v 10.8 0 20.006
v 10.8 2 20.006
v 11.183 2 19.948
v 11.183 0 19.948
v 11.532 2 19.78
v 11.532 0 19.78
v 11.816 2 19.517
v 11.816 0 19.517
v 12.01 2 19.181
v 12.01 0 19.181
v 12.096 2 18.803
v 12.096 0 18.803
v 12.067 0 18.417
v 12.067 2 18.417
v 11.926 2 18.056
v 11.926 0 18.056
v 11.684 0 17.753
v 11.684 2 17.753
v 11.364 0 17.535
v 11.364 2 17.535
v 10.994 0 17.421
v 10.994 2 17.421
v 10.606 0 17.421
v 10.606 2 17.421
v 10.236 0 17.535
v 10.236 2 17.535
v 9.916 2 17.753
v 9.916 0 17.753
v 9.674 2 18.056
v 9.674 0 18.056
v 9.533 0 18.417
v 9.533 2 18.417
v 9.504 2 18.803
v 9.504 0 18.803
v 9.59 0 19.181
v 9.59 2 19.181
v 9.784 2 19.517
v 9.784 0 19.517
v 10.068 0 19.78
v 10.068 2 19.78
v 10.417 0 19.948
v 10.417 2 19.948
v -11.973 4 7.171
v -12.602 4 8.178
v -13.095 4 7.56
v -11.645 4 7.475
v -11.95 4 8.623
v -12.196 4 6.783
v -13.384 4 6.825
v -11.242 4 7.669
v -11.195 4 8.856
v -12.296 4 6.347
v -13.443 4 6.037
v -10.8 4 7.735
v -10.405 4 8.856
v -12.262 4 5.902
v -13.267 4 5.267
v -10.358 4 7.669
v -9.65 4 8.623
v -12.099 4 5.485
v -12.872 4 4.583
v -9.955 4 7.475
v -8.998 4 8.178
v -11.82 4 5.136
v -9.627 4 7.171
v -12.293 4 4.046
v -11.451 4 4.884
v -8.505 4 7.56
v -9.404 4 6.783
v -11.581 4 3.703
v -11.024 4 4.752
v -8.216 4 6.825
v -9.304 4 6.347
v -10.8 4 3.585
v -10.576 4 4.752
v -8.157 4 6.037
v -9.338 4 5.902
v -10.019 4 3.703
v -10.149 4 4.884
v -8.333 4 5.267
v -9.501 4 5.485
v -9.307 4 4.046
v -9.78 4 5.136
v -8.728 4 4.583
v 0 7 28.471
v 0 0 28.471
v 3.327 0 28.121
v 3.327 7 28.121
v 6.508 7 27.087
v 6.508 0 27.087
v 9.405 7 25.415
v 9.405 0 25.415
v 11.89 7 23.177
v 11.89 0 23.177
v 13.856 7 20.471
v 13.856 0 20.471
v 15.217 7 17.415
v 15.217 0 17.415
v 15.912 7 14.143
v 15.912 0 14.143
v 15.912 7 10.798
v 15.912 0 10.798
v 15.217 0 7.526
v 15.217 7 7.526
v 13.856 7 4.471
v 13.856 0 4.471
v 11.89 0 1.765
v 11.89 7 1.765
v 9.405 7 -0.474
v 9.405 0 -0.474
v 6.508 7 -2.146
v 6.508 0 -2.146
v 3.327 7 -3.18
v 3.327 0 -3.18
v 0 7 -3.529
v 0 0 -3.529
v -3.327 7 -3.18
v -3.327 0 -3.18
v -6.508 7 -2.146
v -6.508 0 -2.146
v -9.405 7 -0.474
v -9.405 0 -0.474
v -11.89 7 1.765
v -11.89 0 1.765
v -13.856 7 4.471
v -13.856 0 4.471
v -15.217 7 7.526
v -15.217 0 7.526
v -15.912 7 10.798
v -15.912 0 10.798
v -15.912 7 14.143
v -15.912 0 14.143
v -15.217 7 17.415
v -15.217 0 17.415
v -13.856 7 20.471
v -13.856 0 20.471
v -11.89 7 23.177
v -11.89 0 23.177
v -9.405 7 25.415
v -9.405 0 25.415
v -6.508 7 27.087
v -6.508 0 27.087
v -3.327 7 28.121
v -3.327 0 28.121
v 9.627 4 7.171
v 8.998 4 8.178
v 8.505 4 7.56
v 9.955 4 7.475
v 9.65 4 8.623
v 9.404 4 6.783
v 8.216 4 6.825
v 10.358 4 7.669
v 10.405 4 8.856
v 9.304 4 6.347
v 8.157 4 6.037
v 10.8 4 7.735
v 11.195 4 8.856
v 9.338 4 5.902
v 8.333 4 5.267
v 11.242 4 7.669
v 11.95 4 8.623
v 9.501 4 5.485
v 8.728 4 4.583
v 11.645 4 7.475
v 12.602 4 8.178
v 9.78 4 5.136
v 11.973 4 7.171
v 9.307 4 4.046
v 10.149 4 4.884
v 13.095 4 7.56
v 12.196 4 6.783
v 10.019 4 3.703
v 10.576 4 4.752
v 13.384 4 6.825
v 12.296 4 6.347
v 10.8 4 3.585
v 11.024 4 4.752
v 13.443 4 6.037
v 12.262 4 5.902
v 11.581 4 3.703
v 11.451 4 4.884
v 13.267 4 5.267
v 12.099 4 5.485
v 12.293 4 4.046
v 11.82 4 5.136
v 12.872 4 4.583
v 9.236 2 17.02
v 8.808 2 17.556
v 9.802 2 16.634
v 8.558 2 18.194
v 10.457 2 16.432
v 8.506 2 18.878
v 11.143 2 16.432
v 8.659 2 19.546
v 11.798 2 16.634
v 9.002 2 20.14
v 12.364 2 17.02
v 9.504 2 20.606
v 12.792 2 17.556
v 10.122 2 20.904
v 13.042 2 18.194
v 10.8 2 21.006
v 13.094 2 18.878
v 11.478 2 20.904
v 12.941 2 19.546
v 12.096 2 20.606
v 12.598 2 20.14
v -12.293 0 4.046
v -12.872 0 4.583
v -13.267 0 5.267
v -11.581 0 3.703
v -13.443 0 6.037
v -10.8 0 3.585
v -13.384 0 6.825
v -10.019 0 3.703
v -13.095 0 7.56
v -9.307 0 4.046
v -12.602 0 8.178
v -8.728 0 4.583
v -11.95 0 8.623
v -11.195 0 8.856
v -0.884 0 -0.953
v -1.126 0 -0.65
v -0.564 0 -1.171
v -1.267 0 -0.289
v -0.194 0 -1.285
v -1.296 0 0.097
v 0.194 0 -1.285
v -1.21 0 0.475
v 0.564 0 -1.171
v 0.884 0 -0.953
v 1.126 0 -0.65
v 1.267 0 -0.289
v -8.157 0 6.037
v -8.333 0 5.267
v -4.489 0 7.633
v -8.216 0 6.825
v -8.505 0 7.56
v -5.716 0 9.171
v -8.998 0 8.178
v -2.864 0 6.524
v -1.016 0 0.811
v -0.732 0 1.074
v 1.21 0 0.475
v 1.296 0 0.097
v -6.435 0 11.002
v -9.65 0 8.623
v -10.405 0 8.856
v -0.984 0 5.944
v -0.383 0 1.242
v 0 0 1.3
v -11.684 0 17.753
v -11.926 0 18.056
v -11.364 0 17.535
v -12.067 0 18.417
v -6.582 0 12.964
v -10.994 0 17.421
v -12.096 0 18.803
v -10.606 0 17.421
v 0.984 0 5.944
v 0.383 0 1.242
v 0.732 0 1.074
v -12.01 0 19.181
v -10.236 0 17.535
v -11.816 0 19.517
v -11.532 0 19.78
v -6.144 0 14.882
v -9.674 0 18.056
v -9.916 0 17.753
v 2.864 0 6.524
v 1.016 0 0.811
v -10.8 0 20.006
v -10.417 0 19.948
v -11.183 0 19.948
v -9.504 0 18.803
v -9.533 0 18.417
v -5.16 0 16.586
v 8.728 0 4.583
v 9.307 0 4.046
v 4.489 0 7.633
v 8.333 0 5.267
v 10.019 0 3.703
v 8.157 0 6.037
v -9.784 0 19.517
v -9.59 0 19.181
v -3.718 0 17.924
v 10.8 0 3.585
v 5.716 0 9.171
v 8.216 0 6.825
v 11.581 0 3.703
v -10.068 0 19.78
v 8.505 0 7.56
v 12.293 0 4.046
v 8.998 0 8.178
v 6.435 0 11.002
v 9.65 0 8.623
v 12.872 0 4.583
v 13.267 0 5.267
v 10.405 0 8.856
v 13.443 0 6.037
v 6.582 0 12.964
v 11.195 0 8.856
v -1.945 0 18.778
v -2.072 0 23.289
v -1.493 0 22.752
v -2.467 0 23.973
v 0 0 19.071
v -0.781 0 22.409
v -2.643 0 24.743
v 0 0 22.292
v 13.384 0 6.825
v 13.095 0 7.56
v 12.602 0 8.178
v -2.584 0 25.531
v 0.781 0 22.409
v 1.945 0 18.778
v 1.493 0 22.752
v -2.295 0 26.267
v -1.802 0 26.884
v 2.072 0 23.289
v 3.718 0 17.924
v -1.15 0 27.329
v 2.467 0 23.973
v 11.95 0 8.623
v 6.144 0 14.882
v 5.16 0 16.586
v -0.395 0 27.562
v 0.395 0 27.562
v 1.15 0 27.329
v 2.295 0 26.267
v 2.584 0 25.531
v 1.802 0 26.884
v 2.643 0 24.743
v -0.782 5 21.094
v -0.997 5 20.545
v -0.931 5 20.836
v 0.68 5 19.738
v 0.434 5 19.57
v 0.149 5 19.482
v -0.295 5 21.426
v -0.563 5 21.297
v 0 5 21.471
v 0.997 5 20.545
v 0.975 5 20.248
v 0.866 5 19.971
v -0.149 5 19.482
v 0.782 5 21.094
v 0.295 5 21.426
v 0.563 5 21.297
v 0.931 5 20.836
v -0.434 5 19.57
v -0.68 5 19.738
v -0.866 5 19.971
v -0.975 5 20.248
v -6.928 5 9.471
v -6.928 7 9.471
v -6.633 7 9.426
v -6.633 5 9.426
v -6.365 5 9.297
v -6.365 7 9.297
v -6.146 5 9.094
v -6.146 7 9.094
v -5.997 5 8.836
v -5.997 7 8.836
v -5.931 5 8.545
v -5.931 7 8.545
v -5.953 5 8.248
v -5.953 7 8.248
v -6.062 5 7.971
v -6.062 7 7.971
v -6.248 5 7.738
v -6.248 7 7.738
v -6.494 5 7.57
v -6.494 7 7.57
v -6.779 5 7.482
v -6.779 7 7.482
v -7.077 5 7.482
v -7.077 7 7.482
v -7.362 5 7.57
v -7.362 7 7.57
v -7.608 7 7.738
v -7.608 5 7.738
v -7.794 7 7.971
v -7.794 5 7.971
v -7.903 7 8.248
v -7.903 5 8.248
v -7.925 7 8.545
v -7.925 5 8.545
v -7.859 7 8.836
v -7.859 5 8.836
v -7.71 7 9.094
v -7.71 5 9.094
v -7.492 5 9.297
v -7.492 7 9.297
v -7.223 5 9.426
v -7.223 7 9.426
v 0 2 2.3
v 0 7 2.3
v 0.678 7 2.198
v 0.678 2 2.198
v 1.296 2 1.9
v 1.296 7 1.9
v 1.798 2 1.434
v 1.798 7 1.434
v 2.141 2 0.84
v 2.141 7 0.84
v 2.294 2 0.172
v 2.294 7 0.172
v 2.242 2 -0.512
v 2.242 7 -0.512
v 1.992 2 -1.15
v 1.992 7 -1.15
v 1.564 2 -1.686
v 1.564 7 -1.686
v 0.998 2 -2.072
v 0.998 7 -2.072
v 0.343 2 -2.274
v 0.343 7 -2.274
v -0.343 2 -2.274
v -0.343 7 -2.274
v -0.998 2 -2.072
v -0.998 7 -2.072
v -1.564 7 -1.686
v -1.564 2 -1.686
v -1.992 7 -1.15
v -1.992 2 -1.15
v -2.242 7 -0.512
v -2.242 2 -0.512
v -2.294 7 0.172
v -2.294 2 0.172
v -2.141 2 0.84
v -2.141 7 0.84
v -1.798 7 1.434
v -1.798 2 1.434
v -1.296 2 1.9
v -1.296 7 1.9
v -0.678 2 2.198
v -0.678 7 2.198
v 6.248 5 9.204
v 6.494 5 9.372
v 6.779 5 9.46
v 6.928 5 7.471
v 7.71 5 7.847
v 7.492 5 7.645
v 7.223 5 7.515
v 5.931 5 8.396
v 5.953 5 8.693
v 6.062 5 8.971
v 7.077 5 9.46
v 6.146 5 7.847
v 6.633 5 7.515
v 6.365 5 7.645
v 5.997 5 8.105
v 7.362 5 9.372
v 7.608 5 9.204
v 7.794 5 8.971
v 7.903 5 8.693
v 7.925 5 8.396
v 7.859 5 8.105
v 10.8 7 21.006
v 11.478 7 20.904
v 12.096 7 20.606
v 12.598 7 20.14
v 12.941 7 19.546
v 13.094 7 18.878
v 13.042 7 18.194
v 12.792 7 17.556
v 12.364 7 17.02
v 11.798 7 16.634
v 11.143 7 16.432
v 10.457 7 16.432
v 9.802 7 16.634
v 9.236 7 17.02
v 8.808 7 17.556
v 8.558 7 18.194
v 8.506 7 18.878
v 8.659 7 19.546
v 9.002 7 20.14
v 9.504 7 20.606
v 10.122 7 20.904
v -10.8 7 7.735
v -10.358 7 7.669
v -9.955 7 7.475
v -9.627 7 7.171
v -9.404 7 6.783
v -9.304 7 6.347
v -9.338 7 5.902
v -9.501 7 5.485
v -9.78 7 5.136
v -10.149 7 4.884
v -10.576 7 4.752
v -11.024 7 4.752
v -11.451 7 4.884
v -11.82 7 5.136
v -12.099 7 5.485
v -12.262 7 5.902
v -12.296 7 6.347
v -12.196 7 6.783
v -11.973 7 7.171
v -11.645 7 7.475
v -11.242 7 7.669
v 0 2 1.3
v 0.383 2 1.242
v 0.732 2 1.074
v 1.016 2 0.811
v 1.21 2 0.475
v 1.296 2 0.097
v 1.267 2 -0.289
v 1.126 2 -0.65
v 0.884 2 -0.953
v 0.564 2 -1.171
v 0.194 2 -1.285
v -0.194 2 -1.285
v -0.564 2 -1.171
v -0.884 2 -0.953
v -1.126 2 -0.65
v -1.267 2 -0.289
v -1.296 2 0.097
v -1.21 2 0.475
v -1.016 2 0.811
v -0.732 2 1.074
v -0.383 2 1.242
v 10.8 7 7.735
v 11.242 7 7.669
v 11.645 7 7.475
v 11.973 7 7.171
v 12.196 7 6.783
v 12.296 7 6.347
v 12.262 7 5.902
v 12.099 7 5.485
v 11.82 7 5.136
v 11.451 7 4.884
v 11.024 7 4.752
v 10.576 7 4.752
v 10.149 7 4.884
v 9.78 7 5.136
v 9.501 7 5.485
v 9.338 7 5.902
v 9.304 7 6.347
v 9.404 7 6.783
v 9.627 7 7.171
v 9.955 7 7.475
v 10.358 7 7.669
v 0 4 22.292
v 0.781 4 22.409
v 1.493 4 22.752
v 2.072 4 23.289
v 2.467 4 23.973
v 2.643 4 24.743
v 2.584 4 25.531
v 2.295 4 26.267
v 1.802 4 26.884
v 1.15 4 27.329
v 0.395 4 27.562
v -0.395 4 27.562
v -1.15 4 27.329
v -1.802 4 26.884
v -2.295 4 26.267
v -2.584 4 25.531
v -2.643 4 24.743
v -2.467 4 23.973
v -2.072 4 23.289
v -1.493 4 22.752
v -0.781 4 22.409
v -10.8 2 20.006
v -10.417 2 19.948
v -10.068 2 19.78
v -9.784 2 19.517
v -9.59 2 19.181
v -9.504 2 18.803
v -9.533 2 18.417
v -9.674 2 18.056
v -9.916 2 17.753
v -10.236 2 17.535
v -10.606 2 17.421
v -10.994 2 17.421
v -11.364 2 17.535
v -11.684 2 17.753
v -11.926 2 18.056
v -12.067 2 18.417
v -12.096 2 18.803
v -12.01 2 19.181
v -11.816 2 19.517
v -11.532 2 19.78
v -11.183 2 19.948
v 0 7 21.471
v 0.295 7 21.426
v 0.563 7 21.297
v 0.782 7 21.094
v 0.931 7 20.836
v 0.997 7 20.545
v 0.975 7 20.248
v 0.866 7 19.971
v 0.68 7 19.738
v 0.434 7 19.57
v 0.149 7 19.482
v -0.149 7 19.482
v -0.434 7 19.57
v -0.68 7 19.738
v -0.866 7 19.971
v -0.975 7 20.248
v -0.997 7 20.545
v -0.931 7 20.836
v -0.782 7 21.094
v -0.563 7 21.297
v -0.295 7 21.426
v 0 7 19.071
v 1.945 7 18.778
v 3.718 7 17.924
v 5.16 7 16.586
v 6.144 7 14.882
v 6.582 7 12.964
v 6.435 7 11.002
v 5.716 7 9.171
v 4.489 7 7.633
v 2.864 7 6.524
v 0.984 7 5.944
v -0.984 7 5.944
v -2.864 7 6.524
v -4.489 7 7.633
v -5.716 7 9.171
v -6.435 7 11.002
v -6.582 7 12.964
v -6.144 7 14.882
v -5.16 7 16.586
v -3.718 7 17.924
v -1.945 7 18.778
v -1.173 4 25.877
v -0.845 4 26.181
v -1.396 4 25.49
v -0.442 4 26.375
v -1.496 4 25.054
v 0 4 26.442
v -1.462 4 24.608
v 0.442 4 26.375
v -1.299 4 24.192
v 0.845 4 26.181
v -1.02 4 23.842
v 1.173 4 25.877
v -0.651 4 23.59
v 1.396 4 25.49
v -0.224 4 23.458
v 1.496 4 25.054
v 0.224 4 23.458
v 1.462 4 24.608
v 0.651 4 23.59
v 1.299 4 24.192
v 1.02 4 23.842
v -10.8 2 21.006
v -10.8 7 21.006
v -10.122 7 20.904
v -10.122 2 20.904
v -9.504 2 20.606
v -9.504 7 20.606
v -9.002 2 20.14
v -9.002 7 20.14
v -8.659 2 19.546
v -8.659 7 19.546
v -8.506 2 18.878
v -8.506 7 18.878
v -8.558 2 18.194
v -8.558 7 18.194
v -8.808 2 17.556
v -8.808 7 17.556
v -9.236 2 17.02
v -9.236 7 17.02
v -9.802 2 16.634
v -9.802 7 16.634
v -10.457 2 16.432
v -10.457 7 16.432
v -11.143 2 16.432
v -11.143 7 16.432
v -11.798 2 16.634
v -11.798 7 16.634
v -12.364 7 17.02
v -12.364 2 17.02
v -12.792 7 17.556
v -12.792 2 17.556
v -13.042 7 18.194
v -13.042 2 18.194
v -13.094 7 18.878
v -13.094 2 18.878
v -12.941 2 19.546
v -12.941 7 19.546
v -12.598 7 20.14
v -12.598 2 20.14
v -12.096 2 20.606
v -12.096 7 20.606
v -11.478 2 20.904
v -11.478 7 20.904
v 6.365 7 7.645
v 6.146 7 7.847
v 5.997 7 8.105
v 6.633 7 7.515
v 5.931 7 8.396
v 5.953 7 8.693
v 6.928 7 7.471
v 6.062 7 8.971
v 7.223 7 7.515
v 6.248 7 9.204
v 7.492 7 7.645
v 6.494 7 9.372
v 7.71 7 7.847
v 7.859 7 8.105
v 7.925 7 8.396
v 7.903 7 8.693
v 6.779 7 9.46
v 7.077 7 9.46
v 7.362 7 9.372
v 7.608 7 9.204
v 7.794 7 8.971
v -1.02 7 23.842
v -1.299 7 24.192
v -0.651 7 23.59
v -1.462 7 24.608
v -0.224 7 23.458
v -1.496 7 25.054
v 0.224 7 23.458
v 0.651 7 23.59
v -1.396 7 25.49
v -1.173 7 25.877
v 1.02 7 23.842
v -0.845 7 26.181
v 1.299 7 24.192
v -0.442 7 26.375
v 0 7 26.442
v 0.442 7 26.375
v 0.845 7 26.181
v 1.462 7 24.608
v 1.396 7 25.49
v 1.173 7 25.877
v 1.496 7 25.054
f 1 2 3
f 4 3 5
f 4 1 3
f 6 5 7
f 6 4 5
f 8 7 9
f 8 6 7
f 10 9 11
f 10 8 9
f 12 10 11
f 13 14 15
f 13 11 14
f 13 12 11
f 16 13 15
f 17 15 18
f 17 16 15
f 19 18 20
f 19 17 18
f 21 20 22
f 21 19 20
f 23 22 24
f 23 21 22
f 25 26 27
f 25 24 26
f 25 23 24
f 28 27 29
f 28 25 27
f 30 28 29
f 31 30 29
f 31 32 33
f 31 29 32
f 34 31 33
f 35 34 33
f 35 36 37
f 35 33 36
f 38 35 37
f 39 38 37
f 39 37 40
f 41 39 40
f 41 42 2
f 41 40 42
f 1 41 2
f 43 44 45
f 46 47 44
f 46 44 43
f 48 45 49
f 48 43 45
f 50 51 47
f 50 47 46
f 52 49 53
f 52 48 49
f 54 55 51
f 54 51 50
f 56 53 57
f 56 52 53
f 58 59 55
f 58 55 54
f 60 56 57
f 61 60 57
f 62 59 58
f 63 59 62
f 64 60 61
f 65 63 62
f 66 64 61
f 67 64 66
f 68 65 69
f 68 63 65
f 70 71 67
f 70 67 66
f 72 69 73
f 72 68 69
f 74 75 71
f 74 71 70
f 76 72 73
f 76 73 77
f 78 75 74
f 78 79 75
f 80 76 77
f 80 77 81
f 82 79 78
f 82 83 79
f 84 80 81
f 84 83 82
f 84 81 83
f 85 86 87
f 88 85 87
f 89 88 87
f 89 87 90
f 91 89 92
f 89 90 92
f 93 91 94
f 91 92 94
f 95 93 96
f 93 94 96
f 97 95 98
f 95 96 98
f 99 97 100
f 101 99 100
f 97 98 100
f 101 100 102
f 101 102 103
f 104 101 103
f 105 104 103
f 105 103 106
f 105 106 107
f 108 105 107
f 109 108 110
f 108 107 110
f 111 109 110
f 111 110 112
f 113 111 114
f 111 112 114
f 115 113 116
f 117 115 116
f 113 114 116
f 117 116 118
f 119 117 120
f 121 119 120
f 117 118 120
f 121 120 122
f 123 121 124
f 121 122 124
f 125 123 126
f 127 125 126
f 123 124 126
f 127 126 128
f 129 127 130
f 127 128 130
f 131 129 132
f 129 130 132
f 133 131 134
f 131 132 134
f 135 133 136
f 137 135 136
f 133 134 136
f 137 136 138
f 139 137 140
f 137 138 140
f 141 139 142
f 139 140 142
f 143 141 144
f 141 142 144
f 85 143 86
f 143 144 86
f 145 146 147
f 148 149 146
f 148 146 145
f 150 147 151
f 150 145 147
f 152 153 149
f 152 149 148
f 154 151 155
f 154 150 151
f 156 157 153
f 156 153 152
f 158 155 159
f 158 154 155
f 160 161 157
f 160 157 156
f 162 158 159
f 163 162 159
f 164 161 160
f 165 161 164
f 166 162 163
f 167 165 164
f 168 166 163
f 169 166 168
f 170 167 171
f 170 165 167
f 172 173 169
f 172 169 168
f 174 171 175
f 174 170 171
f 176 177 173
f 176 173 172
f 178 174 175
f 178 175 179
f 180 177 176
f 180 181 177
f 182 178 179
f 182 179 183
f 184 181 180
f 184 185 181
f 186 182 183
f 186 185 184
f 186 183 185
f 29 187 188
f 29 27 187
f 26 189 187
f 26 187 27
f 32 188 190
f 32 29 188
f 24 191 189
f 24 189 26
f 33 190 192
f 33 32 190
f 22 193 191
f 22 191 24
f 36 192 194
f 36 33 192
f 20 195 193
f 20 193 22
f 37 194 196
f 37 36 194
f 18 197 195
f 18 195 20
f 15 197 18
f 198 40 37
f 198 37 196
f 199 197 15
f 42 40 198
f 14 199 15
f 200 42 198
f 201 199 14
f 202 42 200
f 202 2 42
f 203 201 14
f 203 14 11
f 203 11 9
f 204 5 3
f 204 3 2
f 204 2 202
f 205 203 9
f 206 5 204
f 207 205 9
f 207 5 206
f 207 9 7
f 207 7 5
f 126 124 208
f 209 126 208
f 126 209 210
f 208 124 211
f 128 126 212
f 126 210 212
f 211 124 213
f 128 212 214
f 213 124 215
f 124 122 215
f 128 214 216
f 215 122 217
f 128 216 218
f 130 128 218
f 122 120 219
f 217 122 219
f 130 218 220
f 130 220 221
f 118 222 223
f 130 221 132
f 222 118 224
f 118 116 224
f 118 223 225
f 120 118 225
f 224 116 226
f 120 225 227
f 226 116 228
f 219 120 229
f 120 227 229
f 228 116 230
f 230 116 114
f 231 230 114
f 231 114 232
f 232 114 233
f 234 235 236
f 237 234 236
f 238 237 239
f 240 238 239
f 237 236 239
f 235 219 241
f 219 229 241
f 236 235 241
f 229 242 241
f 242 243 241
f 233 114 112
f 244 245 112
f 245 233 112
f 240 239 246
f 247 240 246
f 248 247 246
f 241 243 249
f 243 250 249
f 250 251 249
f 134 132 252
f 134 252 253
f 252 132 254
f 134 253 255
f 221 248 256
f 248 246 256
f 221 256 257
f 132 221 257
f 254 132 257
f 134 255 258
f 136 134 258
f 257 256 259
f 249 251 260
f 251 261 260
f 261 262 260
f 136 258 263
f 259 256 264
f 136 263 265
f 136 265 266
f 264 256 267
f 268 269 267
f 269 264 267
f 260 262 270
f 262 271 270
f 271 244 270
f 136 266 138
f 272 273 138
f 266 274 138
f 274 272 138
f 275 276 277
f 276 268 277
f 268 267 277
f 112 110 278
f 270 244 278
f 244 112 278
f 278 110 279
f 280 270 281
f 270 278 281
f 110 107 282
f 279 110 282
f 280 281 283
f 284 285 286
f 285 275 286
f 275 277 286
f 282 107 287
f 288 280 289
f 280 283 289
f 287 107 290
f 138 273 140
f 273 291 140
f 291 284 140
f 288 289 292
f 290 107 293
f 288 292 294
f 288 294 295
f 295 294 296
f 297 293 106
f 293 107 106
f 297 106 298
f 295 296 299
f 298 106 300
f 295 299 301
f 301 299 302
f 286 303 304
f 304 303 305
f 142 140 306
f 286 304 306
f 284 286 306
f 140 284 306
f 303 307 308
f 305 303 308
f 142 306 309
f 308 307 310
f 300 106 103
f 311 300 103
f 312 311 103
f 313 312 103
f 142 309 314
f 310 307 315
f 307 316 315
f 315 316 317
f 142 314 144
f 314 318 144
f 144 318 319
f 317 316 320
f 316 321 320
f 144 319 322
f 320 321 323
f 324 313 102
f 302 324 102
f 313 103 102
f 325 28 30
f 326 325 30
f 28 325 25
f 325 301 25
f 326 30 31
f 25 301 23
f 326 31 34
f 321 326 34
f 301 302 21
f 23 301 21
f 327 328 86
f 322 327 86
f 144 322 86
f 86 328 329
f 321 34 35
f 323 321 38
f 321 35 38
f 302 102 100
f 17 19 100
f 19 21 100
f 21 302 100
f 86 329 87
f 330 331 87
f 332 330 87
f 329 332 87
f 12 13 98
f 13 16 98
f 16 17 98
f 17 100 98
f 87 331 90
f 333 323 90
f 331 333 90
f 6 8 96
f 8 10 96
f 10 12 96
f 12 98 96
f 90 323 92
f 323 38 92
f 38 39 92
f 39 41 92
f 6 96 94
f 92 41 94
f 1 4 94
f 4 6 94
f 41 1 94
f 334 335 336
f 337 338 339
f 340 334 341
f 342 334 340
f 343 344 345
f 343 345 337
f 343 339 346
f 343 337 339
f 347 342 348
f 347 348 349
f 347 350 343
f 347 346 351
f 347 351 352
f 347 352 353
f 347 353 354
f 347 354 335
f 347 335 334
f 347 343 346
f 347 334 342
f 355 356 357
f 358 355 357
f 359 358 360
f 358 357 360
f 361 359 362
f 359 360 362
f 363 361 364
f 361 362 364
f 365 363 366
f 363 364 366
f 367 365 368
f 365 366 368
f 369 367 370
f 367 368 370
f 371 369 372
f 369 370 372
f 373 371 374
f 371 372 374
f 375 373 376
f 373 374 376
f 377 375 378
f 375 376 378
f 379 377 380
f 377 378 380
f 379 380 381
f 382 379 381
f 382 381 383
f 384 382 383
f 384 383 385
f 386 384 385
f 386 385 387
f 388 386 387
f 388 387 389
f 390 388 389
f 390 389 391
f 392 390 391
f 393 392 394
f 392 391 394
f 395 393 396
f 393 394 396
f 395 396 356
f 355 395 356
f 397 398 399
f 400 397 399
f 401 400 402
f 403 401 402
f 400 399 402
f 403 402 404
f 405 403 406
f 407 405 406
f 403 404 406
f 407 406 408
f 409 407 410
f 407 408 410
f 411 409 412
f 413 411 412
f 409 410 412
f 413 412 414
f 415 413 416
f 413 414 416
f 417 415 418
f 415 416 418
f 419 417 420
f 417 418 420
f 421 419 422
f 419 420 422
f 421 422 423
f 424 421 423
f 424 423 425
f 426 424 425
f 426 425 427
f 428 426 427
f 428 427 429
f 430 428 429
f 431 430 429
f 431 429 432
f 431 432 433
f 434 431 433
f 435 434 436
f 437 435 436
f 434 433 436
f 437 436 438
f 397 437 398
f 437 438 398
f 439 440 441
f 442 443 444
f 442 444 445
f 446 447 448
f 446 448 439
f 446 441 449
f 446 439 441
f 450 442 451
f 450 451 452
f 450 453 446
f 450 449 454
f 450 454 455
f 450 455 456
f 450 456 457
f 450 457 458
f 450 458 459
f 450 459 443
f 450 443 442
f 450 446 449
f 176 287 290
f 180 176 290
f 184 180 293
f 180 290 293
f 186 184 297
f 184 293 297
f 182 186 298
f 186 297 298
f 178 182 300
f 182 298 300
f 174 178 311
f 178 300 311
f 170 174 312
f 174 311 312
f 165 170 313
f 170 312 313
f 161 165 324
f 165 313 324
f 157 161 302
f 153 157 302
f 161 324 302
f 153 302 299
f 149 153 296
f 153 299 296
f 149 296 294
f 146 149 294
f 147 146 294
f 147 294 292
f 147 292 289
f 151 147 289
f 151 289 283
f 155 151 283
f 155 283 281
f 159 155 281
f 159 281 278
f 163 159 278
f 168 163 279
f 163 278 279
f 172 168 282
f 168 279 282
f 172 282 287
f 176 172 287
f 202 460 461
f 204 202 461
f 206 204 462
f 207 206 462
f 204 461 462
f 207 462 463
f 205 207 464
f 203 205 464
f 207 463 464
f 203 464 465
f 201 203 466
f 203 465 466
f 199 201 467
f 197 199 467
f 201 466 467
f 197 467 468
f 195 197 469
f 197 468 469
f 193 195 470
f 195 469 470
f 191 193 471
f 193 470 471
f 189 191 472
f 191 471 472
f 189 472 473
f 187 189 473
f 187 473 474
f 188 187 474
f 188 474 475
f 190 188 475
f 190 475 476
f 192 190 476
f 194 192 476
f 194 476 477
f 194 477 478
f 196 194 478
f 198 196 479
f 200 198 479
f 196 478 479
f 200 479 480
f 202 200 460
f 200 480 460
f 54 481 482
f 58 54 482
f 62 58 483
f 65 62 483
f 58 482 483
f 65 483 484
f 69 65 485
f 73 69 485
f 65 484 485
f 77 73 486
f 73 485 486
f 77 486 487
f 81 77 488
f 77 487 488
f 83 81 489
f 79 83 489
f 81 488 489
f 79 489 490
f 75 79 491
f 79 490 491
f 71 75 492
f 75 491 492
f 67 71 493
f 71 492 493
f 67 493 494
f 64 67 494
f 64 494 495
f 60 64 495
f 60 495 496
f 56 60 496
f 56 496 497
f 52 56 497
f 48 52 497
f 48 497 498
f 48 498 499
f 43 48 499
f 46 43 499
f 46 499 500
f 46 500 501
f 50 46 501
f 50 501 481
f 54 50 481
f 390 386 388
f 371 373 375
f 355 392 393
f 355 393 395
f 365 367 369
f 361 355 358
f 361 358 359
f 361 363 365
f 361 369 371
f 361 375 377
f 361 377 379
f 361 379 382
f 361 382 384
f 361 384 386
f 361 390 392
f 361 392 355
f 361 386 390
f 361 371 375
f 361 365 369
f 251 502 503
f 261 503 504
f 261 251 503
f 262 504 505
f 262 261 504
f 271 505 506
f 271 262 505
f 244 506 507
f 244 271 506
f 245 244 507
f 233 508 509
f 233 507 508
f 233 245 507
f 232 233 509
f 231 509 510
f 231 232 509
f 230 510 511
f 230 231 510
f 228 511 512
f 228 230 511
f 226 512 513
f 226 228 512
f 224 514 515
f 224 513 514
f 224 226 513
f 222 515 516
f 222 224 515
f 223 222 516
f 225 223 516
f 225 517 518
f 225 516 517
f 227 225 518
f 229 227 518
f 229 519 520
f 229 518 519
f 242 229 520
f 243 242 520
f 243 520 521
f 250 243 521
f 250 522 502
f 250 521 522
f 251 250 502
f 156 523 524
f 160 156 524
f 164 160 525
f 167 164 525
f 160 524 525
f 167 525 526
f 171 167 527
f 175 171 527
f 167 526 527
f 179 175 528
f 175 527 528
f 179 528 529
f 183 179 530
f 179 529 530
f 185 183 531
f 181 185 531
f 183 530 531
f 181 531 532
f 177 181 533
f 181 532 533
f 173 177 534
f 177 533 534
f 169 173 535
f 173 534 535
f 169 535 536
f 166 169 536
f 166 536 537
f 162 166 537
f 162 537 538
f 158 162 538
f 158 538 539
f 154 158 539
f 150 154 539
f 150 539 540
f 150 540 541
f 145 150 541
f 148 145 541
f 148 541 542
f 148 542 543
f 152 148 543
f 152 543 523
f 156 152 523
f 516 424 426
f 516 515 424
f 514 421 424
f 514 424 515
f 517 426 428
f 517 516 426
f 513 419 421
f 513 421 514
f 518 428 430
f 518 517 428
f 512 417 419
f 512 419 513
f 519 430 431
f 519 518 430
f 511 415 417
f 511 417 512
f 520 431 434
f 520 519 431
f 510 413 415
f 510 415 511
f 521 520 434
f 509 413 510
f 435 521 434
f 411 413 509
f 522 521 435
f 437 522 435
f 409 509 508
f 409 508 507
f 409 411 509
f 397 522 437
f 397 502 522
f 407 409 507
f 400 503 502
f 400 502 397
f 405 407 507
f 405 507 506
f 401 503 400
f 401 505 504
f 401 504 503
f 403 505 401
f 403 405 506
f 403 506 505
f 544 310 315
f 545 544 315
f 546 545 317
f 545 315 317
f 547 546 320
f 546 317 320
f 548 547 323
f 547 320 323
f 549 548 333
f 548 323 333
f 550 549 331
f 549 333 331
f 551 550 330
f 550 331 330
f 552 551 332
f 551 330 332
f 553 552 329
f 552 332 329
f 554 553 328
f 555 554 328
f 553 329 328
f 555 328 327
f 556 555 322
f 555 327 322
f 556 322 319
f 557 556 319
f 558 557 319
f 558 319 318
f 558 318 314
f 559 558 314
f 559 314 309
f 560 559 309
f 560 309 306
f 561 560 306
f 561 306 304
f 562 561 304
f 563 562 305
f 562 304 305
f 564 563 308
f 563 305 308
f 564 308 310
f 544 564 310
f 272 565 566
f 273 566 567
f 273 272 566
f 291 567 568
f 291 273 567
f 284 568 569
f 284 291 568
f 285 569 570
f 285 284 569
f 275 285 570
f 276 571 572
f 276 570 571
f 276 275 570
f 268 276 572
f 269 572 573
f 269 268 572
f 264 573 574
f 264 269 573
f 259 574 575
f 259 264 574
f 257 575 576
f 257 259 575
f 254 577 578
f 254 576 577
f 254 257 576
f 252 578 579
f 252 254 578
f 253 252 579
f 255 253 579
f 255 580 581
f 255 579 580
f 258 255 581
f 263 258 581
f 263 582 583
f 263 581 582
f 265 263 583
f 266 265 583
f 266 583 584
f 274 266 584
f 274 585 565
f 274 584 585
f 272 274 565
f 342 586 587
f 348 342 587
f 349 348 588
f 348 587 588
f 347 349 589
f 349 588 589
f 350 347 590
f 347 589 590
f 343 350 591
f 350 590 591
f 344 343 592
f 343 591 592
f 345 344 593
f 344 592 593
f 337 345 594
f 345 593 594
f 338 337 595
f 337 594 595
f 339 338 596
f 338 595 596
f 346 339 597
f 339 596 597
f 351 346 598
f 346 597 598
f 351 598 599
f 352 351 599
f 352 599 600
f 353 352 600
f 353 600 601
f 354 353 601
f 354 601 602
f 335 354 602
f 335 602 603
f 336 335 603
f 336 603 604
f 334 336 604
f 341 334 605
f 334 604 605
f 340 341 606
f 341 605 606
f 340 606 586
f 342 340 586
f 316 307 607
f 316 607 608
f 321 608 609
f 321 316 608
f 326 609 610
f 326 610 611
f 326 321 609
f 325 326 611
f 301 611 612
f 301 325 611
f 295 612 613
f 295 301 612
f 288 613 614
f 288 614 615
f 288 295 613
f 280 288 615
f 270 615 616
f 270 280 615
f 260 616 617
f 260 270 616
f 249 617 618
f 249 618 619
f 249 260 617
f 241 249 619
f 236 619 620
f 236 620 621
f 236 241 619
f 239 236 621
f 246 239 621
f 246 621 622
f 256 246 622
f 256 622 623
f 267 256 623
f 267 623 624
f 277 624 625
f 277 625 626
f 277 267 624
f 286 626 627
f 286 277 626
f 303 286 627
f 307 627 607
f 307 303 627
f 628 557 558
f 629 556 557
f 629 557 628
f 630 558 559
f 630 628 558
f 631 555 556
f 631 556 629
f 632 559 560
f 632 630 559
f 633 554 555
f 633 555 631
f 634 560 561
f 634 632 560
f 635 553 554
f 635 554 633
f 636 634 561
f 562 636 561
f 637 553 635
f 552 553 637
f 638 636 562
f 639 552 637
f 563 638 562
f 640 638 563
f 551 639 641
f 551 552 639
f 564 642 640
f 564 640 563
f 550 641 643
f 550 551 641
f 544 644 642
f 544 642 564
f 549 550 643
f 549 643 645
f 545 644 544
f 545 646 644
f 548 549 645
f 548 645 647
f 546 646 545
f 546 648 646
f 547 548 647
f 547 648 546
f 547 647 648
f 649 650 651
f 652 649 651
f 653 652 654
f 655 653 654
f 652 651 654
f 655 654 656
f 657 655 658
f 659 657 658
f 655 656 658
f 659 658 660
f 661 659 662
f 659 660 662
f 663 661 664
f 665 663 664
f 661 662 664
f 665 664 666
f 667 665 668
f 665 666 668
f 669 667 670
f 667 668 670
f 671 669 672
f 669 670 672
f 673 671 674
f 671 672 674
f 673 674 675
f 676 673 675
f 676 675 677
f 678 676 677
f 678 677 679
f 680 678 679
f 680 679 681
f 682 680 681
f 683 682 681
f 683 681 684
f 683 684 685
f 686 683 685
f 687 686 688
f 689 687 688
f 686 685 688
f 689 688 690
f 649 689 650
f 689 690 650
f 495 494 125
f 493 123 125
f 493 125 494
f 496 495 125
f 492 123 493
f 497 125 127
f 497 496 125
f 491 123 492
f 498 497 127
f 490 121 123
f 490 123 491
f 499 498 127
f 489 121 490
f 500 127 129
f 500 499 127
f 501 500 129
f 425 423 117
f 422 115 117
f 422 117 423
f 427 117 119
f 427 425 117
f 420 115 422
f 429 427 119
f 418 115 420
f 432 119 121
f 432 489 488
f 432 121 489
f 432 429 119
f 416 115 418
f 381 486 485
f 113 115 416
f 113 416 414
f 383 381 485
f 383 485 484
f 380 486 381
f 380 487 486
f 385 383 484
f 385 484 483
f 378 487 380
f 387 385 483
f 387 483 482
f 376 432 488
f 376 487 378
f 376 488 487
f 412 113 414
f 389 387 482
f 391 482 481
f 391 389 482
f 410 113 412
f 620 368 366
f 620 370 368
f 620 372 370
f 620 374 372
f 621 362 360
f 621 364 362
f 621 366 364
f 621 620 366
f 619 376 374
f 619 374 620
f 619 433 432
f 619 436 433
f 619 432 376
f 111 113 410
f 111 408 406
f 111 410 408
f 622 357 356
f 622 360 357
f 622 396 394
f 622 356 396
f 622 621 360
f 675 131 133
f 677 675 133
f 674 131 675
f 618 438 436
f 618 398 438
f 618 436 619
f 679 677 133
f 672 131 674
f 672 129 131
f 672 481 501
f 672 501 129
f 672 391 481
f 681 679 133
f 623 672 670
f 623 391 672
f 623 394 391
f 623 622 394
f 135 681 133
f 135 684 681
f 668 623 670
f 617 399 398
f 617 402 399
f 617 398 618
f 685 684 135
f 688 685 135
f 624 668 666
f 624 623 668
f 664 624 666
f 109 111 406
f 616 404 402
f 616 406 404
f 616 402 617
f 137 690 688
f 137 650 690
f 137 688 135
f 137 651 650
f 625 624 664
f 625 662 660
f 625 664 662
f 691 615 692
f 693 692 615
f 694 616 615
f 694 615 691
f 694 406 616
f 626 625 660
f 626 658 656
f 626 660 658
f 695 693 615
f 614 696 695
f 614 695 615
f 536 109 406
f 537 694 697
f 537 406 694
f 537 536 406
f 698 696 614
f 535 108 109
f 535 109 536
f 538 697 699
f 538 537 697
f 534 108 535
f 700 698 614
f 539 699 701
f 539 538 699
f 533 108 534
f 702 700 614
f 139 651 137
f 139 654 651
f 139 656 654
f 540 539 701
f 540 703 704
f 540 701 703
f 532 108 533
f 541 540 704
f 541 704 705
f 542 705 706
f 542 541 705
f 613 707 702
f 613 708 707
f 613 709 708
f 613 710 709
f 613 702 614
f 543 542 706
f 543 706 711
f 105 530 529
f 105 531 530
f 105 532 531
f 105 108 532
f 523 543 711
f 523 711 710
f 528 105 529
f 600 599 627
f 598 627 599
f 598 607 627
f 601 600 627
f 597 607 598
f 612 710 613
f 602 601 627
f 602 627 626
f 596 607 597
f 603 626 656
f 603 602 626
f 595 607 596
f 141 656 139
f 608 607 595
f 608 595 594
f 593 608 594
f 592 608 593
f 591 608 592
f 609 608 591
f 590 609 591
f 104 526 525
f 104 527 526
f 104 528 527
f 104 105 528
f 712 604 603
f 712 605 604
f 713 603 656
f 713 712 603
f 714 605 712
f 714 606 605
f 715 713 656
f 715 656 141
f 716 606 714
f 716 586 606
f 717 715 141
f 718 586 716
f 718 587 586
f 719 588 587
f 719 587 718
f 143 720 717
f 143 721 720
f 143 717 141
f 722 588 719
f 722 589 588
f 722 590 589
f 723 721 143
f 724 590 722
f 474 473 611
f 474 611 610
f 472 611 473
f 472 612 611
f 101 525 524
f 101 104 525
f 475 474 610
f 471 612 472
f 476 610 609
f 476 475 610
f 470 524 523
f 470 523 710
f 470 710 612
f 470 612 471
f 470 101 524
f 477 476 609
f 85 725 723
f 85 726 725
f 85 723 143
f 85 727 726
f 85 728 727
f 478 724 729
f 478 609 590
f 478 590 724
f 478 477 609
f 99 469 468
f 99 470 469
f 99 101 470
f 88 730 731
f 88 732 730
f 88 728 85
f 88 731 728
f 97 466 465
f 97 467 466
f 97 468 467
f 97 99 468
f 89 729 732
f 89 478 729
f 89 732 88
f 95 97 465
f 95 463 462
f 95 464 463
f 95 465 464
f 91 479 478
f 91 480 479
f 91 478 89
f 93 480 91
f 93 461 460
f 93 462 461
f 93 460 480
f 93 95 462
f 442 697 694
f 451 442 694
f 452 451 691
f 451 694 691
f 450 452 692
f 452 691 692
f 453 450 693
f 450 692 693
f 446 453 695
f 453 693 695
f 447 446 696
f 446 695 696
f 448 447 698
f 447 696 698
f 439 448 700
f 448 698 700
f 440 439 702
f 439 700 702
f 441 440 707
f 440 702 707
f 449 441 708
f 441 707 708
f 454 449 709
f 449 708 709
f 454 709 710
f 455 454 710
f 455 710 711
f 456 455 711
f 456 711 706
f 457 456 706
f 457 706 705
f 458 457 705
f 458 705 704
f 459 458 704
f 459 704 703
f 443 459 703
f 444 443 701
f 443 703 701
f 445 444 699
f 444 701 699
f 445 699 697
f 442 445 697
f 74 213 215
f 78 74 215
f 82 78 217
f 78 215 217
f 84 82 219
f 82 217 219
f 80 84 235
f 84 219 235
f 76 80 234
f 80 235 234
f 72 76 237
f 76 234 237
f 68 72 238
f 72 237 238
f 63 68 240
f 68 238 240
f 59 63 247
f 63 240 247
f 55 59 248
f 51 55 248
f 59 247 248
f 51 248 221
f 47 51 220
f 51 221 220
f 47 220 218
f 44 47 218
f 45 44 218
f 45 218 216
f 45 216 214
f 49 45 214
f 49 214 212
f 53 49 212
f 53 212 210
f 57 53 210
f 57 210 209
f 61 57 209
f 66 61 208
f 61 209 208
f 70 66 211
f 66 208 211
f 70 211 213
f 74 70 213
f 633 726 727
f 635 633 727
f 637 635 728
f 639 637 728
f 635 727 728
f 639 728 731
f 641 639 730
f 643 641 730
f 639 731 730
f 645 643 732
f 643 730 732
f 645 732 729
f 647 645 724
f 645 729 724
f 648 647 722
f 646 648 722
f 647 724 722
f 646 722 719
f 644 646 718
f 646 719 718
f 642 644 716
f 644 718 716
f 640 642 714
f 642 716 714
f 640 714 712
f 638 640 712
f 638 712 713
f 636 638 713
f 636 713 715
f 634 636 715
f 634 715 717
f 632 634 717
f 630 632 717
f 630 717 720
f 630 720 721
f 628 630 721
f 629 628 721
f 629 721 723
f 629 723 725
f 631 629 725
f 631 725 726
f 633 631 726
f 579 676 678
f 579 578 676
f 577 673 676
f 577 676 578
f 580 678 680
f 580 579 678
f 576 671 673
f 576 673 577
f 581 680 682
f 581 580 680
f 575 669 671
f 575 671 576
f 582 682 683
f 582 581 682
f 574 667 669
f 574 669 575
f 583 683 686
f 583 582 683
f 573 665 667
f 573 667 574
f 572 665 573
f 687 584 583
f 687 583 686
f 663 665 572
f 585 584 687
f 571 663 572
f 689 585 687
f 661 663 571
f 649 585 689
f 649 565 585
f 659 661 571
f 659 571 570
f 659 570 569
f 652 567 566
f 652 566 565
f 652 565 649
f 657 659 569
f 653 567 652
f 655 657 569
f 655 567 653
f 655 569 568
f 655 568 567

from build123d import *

# Parameters (mm, degrees)
SKETCH_1_R          = 16
SKETCH_1_R_2        = 6.6
SKETCH_1_R_3        = 1.3
EXTRUDE_1_DEPTH     = 7
SKETCH_2_R          = 2.3
CUT_EXTRUDE_2_DEPTH = 5
SKETCH_4_R          = 1
CUT_EXTRUDE_3_DEPTH = 2
SKETCH_5_R          = 1.5
CUT_EXTRUDE_4_DEPTH = 34.400366855
SKETCH_6_R          = 2.65
CUT_EXTRUDE_5_DEPTH = 4


with BuildPart() as part:
    # 草图1 → 凸台-拉伸1 (new body)
    with BuildSketch(Plane(origin=(0, 0, 0), x_dir=(1, 0, 0), z_dir=(0, 1, 0))):
        with Locations(Location((0, -12.470765814, 0), (0, 0, 270))):
            Circle(SKETCH_1_R)
        with Locations(Location((0, -12.470765814, 0), (0, 0, 270))):
            Circle(SKETCH_1_R_2, mode=Mode.SUBTRACT)
        with Locations(Location((-10.8, -18.706148722, 0), (0, 0, 270))):
            Circle(SKETCH_1_R_3, mode=Mode.SUBTRACT)
        with Locations(Location((10.8, -18.706148722, 0), (0, 0, 270))):
            Circle(SKETCH_1_R_3, mode=Mode.SUBTRACT)
        with Locations(Location((0, 0, 0), (0, 0, 270))):
            Circle(SKETCH_1_R_3, mode=Mode.SUBTRACT)
    extrude(amount=EXTRUDE_1_DEPTH)

    # 草图2 → 切除-拉伸2 (cut)
    with BuildSketch(Plane(origin=(0, 7, 0), x_dir=(1, 0, 0), z_dir=(0, 1, 0))):
        with Locations(Location((-10.8, -18.706148722, 0), (0, 0, 270))):
            Circle(SKETCH_2_R)
        with Locations(Location((10.8, -18.706148722, 0), (0, 0, 270))):
            Circle(SKETCH_2_R)
        with Locations(Location((0, 0, 0), (0, 0, 270))):
            Circle(SKETCH_2_R)
    extrude(amount=-CUT_EXTRUDE_2_DEPTH, mode=Mode.SUBTRACT)

    # 草图4 → 切除-拉伸3 (cut)
    with BuildSketch(Plane(origin=(0, 7, 0), x_dir=(1, 0, 0), z_dir=(0, 1, 0))):
        with Locations(Location((-6.92820323, -8.470765814, 0), (0, 0, 270))):
            Circle(SKETCH_4_R)
        with Locations(Location((6.92820323, -8.470765814, 0), (0, 0, 90))):
            Circle(SKETCH_4_R)
        with Locations(Location((0, -20.470765814, 0), (0, 0, 270))):
            Circle(SKETCH_4_R)
    extrude(amount=-CUT_EXTRUDE_3_DEPTH, mode=Mode.SUBTRACT)

    # 草图5 → 切除-拉伸4 (cut, through all)
    with BuildSketch(Plane(origin=(0, 7, 0), x_dir=(1, 0, 0), z_dir=(0, 1, 0))):
        with Locations(Location((-10.8, -6.235382907, 0), (0, 0, 270))):
            Circle(SKETCH_5_R)
        with Locations(Location((10.8, -6.235382907, 0), (0, 0, 270))):
            Circle(SKETCH_5_R)
        with Locations(Location((0, -24.941531629, 0), (0, 0, 270))):
            Circle(SKETCH_5_R)
    extrude(amount=-CUT_EXTRUDE_4_DEPTH, mode=Mode.SUBTRACT)

    # 草图6 → 切除-拉伸5 (cut)
    with BuildSketch(Plane.XZ):
        with Locations(Location((0, 24.941531629, 0), (0, 0, 270))):
            Circle(SKETCH_6_R)
        with Locations(Location((-10.8, 6.235382907, 0), (0, 0, 270))):
            Circle(SKETCH_6_R)
        with Locations(Location((10.8, 6.235382907, 0), (0, 0, 270))):
            Circle(SKETCH_6_R)
    extrude(amount=-CUT_EXTRUDE_5_DEPTH, mode=Mode.SUBTRACT)


solid = part.part
